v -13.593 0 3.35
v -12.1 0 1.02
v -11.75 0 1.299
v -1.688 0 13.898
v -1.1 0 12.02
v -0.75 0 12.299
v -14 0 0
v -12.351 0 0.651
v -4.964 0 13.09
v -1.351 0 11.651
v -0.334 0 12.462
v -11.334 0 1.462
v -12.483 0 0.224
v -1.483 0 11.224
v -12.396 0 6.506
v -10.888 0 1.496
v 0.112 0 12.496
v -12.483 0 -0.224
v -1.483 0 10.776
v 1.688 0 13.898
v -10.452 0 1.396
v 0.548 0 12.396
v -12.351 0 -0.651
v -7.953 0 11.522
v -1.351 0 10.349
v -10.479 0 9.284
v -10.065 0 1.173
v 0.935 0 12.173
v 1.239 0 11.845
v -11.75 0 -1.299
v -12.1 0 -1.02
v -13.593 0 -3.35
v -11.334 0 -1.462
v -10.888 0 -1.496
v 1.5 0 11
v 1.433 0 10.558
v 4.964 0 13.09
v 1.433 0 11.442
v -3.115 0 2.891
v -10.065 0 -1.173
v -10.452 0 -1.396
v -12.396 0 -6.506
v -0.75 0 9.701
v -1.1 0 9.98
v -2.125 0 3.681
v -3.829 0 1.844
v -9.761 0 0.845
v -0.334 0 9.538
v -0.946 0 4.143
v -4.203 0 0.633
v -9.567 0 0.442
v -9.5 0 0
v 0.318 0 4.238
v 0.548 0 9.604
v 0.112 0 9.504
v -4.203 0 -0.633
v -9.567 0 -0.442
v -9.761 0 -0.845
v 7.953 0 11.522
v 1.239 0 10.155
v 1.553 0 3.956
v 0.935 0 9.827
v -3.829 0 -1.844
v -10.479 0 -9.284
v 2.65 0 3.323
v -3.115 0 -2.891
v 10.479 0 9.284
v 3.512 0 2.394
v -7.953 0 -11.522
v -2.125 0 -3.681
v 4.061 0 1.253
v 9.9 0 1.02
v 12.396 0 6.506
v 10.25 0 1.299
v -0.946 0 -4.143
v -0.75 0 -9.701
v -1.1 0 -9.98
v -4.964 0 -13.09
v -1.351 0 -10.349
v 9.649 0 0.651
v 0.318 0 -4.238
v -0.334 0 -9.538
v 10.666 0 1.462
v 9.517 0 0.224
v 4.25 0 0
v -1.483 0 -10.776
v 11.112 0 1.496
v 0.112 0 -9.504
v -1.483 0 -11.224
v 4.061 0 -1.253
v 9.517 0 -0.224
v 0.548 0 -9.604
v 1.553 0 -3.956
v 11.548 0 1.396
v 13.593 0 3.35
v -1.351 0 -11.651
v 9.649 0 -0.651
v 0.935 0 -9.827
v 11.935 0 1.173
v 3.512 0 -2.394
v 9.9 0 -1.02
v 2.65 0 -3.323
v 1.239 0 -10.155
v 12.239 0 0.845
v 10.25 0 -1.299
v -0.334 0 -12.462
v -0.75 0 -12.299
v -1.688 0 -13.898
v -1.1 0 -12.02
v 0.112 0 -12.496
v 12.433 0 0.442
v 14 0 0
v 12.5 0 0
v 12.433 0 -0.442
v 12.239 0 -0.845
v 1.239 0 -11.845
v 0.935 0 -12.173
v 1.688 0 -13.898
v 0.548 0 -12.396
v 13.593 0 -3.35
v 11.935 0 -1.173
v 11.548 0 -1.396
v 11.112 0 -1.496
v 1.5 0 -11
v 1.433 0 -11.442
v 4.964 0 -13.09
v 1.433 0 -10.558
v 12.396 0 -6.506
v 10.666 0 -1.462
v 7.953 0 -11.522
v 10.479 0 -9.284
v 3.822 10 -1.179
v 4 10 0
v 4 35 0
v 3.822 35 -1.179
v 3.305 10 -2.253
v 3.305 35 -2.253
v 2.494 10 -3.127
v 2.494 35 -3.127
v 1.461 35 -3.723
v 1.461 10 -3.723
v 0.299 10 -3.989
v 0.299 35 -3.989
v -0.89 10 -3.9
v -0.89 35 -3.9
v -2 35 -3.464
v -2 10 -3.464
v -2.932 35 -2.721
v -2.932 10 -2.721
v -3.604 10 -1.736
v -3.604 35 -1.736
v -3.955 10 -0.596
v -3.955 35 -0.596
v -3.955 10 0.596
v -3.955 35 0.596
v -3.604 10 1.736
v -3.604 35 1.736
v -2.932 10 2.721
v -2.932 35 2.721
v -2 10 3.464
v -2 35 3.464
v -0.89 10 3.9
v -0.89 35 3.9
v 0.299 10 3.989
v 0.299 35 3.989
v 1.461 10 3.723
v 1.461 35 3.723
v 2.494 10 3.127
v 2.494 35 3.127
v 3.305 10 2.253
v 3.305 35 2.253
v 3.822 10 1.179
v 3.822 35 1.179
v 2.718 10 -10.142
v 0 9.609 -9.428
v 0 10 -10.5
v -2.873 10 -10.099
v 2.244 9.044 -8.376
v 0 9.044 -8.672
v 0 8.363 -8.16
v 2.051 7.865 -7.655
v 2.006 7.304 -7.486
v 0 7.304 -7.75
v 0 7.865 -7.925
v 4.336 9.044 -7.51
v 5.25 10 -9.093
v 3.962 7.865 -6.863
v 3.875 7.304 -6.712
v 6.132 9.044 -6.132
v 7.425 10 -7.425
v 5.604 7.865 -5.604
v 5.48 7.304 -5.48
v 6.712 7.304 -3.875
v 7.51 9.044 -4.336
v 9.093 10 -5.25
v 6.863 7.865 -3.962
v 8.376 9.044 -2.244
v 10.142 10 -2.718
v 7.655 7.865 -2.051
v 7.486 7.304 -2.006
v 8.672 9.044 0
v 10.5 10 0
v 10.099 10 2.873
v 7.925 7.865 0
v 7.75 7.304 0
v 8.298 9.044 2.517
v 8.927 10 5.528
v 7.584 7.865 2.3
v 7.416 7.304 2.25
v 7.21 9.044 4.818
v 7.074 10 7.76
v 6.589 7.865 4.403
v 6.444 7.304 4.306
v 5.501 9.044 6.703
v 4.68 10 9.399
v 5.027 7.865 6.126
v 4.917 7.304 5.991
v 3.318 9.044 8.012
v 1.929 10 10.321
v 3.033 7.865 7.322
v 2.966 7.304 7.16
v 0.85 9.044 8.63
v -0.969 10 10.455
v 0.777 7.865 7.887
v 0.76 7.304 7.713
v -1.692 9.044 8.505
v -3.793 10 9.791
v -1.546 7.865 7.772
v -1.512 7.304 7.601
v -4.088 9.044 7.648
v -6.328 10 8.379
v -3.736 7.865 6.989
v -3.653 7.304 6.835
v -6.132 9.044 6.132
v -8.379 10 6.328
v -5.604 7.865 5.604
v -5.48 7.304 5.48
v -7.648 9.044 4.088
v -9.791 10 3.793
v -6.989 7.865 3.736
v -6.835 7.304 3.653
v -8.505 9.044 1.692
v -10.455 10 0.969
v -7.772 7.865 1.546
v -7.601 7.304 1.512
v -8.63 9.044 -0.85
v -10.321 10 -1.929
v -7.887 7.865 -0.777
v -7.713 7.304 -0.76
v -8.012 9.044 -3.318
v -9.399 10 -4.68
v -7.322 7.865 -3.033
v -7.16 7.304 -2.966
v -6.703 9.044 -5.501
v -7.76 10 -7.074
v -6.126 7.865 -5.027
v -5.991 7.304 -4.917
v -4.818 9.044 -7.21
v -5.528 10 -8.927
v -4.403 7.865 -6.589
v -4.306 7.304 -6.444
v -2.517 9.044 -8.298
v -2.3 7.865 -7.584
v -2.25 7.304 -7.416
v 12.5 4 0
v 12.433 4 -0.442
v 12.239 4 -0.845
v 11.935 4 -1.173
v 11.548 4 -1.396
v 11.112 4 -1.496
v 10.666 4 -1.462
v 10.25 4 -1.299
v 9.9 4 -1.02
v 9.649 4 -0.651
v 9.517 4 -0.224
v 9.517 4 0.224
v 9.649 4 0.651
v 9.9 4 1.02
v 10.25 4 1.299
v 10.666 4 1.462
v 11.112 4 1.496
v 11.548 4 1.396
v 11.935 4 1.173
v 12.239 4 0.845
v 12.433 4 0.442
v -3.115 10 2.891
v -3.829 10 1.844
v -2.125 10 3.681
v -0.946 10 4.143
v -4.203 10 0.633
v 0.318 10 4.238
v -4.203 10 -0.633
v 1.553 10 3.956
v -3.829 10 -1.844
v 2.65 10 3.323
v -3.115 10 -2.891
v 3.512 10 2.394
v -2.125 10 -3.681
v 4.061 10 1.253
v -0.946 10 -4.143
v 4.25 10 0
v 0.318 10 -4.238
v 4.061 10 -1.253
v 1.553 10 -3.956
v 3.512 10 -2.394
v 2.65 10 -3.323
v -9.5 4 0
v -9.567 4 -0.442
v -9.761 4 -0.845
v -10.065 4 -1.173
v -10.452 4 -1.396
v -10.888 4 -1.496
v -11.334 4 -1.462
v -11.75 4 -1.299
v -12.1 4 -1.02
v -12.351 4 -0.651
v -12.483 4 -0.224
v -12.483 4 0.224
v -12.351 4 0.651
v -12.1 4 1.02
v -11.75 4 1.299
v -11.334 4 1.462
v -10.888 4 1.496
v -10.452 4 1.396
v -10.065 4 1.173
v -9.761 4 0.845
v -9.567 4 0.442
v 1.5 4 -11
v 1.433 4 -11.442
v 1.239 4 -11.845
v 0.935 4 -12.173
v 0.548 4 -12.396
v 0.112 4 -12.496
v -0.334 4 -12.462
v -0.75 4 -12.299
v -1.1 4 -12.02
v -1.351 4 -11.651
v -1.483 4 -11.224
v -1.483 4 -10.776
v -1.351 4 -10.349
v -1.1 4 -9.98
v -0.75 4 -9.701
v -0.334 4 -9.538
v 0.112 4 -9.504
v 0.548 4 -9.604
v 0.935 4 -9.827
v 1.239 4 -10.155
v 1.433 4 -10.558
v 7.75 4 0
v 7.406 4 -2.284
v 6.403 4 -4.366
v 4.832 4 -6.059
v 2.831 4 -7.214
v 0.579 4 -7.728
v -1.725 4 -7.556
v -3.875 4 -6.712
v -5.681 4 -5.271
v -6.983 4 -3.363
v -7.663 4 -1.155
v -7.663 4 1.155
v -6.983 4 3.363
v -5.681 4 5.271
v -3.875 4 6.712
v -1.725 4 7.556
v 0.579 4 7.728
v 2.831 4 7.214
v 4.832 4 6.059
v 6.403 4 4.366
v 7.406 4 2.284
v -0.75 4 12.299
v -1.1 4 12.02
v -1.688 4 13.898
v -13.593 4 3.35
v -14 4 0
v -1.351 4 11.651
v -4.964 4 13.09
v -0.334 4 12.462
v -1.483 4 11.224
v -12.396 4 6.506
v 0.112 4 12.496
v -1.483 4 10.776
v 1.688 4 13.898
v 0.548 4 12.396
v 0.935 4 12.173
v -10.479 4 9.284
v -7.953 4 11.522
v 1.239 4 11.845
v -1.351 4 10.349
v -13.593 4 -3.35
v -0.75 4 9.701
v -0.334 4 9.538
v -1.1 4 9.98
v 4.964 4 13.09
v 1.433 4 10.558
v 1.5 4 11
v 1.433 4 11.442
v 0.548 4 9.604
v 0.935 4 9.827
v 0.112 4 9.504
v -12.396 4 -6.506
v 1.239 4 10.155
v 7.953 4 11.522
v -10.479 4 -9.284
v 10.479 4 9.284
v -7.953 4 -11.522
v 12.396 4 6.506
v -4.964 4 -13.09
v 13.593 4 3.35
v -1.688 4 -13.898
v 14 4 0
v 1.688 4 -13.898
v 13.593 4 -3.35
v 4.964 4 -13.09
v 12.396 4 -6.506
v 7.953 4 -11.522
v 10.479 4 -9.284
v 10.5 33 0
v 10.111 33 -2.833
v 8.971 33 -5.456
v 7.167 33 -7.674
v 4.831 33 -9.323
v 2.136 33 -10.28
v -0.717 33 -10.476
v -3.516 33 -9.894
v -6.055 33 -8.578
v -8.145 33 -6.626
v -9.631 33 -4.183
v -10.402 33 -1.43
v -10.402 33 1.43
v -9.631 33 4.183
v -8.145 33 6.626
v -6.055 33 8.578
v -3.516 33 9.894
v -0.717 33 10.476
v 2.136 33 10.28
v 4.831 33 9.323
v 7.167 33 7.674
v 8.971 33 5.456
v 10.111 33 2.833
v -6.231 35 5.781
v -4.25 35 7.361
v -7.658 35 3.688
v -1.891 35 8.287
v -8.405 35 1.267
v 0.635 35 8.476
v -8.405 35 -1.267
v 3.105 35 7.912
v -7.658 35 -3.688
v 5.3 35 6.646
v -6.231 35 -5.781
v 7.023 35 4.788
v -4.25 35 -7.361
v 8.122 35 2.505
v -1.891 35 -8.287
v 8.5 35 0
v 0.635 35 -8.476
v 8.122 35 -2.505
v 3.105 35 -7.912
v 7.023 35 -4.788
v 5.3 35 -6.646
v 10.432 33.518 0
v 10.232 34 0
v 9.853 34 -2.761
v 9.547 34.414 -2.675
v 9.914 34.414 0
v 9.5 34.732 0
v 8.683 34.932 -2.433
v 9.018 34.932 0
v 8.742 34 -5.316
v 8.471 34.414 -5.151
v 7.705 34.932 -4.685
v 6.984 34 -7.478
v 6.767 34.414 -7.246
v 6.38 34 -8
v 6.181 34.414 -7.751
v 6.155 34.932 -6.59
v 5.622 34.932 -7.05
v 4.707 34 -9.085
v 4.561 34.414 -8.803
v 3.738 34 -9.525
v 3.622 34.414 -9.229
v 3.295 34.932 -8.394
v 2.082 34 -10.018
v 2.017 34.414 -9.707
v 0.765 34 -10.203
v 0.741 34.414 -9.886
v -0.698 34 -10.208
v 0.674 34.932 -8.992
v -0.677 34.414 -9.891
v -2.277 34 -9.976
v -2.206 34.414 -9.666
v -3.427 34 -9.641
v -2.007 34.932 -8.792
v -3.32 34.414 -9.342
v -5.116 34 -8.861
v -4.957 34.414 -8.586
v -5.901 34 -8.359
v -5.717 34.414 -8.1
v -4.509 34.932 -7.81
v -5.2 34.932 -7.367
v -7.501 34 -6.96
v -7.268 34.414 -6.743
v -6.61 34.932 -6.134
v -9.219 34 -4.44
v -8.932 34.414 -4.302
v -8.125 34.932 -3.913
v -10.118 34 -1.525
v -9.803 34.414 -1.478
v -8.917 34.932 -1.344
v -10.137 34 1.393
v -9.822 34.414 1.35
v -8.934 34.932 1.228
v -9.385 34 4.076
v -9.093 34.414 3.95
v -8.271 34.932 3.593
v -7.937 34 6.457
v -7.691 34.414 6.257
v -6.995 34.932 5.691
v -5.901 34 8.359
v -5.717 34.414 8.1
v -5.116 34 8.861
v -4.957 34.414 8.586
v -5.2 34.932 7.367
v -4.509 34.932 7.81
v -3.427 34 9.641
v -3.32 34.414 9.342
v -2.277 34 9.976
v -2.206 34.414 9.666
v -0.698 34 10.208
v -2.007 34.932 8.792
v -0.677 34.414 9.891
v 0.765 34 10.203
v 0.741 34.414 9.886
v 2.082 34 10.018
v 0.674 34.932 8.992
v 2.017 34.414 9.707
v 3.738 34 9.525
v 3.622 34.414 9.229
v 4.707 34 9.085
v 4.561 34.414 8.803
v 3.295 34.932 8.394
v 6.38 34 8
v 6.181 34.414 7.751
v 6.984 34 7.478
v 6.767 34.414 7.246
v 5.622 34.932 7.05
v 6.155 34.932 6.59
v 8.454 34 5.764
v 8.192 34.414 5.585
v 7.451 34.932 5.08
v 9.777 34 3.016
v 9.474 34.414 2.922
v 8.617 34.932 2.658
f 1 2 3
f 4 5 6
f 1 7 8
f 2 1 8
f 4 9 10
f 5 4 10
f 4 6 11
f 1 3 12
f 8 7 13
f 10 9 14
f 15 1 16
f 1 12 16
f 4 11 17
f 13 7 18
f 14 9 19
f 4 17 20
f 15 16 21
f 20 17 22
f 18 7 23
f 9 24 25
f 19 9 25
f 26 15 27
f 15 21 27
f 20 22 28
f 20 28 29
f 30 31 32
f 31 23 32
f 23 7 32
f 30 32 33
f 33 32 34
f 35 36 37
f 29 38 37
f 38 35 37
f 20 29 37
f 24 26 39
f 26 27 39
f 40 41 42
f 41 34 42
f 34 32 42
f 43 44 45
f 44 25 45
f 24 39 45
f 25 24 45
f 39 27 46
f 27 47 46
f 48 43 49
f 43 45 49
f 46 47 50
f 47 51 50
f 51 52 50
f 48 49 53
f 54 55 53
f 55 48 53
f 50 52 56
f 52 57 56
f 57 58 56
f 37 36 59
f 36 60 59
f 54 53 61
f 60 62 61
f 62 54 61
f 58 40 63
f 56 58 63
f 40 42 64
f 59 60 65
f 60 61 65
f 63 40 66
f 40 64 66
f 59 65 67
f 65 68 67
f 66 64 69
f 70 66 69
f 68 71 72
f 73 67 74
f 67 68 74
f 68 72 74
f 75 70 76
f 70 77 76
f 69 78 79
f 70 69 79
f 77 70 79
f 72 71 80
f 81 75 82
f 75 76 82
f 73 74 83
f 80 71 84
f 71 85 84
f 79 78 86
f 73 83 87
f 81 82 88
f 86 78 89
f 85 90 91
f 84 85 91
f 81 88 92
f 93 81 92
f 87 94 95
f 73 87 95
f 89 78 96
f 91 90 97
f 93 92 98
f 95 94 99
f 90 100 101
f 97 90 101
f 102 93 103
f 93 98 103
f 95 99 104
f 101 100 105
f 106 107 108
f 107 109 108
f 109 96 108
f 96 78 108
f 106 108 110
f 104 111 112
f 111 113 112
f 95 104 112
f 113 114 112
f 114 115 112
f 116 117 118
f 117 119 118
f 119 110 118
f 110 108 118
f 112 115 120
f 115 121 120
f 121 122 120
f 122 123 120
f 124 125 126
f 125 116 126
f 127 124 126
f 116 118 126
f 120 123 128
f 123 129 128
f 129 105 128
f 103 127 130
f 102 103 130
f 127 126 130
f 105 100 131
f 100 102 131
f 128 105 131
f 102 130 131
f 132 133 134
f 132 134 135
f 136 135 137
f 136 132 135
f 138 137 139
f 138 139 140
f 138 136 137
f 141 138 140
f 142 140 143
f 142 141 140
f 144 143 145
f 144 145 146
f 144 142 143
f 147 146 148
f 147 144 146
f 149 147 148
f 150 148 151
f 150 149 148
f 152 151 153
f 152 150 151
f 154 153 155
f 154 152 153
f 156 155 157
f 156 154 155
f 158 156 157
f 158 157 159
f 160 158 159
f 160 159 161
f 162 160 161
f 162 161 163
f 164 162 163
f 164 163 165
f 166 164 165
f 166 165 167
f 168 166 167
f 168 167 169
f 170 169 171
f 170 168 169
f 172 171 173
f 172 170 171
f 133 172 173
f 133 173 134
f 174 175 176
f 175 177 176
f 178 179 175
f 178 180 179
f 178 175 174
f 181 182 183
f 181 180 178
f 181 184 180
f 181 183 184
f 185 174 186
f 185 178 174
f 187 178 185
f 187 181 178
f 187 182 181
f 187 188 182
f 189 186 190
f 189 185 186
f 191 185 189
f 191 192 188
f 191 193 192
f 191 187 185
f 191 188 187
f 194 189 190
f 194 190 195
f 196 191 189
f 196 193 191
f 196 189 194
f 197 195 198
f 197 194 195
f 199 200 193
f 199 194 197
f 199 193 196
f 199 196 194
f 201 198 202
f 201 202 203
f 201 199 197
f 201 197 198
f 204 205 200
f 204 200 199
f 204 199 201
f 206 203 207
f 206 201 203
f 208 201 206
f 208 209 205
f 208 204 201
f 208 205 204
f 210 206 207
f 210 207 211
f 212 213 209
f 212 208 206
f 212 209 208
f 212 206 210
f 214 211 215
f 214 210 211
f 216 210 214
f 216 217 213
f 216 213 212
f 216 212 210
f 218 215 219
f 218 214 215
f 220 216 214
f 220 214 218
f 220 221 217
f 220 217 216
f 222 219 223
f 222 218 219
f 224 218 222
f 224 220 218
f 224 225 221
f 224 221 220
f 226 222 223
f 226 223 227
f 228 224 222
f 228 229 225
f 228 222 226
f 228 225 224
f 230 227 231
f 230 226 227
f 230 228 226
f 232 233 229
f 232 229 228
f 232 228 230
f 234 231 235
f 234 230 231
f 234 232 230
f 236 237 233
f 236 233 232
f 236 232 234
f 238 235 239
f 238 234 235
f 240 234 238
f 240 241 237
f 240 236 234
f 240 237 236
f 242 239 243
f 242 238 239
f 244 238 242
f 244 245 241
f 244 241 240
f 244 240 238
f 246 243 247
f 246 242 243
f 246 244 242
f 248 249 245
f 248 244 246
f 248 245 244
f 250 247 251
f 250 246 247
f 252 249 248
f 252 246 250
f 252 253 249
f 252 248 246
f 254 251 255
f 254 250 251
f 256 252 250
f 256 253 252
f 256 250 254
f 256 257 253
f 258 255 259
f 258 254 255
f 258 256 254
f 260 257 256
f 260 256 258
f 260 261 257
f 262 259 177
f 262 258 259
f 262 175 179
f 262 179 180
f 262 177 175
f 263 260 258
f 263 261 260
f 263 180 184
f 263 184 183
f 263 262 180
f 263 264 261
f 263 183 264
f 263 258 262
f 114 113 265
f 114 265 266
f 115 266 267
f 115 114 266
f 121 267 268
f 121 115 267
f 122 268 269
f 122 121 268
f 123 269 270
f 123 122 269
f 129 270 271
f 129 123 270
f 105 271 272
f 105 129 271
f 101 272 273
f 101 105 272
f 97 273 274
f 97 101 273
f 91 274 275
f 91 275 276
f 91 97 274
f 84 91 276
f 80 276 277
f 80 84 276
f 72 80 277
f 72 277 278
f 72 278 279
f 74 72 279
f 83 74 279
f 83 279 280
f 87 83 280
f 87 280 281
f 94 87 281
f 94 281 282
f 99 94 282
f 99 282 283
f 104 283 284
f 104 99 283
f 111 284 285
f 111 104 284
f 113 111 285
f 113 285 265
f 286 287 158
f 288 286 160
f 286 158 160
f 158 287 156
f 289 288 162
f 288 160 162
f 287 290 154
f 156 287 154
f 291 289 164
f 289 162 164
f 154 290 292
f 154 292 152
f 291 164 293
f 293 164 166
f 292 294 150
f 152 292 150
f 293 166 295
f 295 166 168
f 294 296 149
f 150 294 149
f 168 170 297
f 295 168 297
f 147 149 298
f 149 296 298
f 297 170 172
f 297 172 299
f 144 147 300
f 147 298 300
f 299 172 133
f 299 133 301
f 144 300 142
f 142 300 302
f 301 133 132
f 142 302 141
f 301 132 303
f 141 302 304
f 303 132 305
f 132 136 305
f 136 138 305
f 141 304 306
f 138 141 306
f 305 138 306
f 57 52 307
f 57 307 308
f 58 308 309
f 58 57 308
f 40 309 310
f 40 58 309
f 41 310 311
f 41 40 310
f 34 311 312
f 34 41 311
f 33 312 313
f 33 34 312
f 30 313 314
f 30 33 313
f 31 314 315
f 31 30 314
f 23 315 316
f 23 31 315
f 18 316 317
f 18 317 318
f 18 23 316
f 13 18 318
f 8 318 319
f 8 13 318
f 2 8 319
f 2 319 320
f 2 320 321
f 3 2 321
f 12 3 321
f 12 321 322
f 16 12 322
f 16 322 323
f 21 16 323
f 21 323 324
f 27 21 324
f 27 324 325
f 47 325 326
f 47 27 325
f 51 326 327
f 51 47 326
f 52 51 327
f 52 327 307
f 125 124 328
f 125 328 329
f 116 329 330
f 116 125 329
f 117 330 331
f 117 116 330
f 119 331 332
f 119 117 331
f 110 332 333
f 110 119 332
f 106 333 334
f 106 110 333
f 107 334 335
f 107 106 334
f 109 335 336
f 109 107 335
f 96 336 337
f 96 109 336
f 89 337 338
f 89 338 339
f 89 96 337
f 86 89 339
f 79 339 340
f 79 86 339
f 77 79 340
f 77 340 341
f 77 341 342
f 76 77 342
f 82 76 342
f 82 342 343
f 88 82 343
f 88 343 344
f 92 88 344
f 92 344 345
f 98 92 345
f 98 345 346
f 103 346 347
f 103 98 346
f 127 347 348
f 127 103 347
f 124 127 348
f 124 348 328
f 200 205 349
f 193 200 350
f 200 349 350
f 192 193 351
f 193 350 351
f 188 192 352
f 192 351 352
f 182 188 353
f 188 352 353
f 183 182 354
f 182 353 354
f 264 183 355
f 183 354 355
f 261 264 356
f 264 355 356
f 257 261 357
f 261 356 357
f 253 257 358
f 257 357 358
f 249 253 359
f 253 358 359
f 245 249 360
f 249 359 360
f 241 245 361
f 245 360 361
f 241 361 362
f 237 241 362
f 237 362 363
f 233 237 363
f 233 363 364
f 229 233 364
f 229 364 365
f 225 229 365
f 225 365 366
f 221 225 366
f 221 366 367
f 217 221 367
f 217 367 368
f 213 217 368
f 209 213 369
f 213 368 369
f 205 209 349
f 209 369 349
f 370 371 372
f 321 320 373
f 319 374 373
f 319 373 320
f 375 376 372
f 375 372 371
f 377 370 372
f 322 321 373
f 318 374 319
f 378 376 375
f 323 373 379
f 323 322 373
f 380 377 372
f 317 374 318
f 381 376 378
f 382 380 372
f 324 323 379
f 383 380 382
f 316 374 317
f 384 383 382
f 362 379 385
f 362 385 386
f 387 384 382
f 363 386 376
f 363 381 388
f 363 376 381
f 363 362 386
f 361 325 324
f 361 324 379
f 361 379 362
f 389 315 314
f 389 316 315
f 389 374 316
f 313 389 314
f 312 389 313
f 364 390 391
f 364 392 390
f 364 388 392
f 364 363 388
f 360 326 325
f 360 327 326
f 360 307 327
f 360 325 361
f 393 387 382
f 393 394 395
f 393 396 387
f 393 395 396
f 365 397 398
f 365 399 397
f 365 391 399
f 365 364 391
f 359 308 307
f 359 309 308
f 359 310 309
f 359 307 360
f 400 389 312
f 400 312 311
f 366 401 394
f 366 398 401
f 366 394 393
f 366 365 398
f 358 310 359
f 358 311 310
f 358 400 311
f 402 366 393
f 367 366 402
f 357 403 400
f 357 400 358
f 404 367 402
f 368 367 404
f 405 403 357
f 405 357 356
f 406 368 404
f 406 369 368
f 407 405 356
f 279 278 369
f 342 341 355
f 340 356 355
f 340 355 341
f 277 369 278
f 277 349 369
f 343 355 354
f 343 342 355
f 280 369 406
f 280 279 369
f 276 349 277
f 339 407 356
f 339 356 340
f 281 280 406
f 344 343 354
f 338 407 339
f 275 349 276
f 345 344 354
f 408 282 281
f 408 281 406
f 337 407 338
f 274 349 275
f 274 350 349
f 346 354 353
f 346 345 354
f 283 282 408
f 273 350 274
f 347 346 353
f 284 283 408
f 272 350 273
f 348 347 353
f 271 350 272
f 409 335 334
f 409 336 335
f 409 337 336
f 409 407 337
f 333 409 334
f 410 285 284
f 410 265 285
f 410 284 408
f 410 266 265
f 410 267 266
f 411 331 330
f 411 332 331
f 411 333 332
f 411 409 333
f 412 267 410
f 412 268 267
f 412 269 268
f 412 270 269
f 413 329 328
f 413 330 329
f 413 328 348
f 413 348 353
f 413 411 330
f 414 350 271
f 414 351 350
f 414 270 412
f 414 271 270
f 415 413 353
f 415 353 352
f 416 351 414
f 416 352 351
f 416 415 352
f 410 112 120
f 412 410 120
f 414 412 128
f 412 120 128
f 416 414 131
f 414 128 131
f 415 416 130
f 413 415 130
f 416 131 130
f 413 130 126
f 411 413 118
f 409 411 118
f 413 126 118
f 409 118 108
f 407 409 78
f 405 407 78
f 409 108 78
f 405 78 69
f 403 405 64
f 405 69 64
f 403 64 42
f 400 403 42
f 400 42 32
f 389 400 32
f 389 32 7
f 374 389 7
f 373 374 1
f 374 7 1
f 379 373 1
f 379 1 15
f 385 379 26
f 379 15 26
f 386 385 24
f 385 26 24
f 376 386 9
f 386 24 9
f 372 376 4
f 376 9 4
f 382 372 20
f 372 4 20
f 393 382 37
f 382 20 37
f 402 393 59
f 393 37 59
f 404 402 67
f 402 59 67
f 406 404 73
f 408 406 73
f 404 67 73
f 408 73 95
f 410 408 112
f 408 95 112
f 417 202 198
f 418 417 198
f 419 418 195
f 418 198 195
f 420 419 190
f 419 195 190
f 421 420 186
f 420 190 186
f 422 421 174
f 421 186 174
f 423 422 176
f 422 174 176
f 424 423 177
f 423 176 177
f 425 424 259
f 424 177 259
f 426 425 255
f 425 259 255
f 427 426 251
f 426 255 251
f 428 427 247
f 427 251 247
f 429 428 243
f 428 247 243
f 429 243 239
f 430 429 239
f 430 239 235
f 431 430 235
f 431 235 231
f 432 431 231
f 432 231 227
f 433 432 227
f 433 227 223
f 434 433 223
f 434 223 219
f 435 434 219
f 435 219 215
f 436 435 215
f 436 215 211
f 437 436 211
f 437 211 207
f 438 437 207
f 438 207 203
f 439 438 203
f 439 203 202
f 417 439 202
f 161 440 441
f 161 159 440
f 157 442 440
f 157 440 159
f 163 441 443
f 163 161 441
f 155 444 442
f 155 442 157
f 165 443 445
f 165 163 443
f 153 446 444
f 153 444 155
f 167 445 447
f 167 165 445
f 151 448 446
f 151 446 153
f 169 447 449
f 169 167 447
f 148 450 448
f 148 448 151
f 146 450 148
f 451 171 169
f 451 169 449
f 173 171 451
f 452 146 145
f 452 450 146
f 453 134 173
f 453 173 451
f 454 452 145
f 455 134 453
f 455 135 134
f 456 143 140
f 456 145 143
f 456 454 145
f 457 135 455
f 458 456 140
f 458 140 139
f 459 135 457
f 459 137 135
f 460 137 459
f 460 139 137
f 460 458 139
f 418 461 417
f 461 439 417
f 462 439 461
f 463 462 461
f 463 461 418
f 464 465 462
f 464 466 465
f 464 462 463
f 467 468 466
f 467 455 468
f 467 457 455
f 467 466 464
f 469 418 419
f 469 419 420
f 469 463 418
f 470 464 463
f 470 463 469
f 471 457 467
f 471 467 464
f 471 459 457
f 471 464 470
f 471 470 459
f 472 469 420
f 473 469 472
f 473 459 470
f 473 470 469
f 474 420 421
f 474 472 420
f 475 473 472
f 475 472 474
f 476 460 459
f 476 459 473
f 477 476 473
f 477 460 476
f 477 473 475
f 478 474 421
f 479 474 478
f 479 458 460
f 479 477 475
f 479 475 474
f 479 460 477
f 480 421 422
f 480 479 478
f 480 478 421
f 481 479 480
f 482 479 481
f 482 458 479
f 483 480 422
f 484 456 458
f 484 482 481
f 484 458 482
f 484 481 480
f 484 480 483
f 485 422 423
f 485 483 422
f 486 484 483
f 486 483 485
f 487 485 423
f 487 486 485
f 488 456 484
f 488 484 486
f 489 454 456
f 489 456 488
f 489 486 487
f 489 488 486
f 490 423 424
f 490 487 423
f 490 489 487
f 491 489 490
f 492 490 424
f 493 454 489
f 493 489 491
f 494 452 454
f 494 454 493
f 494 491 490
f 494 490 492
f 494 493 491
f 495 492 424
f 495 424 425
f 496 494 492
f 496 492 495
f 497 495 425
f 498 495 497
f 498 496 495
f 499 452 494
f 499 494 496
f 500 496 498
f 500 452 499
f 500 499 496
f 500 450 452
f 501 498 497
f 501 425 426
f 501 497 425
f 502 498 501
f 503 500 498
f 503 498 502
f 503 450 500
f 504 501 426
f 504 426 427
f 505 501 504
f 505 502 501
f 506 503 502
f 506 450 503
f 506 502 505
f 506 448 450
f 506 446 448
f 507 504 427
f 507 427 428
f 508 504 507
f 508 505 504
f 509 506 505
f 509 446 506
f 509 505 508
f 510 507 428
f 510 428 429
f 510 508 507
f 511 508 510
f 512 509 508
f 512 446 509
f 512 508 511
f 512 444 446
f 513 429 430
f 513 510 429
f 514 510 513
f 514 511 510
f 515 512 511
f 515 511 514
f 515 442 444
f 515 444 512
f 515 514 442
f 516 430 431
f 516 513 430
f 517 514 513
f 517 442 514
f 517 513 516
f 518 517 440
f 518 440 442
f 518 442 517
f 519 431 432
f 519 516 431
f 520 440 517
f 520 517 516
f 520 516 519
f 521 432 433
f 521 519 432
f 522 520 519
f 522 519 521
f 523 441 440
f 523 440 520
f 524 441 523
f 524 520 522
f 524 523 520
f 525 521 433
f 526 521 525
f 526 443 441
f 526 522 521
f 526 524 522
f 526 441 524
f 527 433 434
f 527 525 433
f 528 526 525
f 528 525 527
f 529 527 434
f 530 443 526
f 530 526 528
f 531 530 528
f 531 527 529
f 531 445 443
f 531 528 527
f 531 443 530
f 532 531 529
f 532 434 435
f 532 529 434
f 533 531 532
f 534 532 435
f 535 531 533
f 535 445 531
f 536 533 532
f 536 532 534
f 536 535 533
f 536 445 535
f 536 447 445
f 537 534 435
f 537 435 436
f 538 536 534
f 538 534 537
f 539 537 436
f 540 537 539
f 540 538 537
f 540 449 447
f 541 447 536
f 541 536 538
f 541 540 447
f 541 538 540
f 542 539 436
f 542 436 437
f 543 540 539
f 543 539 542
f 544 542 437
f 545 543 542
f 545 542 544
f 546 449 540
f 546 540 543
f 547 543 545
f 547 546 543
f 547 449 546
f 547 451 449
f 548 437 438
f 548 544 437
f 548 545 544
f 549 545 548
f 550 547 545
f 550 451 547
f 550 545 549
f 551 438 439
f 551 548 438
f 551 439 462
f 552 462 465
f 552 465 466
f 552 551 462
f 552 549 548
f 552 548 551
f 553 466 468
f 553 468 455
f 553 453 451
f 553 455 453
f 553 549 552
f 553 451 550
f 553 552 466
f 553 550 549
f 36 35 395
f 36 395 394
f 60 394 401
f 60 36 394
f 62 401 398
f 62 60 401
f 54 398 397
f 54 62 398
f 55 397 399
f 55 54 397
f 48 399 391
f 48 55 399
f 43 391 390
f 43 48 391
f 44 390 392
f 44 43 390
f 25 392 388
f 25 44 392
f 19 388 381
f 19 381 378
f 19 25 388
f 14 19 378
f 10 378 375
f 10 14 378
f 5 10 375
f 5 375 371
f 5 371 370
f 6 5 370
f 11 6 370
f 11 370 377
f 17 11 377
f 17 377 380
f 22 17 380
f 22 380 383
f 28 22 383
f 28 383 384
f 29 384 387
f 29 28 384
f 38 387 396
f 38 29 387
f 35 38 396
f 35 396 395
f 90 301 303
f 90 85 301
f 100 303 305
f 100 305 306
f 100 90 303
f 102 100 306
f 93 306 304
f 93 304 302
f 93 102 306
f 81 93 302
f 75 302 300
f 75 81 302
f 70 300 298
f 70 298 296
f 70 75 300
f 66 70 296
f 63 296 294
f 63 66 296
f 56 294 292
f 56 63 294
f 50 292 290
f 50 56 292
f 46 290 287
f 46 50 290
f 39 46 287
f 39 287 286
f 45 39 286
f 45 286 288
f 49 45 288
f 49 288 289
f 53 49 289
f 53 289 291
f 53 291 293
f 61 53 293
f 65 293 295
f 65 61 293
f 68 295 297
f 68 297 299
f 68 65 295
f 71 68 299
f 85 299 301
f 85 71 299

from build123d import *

# Parameters (mm, degrees)
SKETCH1_R           = 14
SKETCH1_R_2         = 1.5
SKETCH1_R_3         = 4.25
BOSS_EXTRUDE1_DEPTH = 4
SKETCH2_R           = 7.75
SKETCH2_R_2         = 4.25
BOSS_EXTRUDE2_DEPTH = 6
SKETCH3_R           = 10.5
SKETCH3_R_2         = 4
BOSS_EXTRUDE3_DEPTH = 25
FILLET1_R           = 2


with BuildPart() as part:
    # Sketch1 → Boss-Extrude1 (new body)
    with BuildSketch(Plane(origin=(0, 0, 0), x_dir=(1, 0, 0), z_dir=(0, 1, 0))):
        Circle(SKETCH1_R)
        with Locations((0, 11)):
            Circle(SKETCH1_R_2, mode=Mode.SUBTRACT)
        with Locations((0, -11)):
            Circle(SKETCH1_R_2, mode=Mode.SUBTRACT)
        with Locations((11, 0)):
            Circle(SKETCH1_R_2, mode=Mode.SUBTRACT)
        with Locations((-11, 0)):
            Circle(SKETCH1_R_2, mode=Mode.SUBTRACT)
        Circle(SKETCH1_R_3, mode=Mode.SUBTRACT)
    extrude(amount=BOSS_EXTRUDE1_DEPTH)

    # Sketch2 → Boss-Extrude2 (add)
    with BuildSketch(Plane(origin=(0, 4, 0), x_dir=(1, 0, 0), z_dir=(0, 1, 0))):
        Circle(SKETCH2_R)
        Circle(SKETCH2_R_2, mode=Mode.SUBTRACT)
    extrude(amount=BOSS_EXTRUDE2_DEPTH)



with BuildPart() as body_2:
    # Sketch3 → Boss-Extrude3 (new body)
    with BuildSketch(Plane(origin=(0, 10, 0), x_dir=(1, 0, 0), z_dir=(0, 1, 0))):
        Circle(SKETCH3_R)
        Circle(SKETCH3_R_2, mode=Mode.SUBTRACT)
    extrude(amount=BOSS_EXTRUDE3_DEPTH)


with BuildPart() as part_1:
    add(part.part)

    add(body_2.part)  # Revolve1 merges body 2
    # Sketch4 → Revolve1 (revolve)
    with BuildSketch(Plane(origin=(0, 0, 0), x_dir=(0, 0, -1), z_dir=(1, 0, 0))):
        with BuildLine():
            Line((7.75, 10), (10.5, 10))
            add(Edge.make_bspline(
                [(10.5, 10), (8.289227016, 9.506903226), (7.75, 7.304459311)],
                knots=[0, 0, 0, 1, 1, 1], degree=2))
            Line((7.75, 7.304459311), (7.75, 10))
        make_face()
    revolve(axis=Axis((0, 36.75, 0), (0, -1, 0)))

    # Fillet1
    fillet1_edges = [part_1.edges().sort_by_distance(p)[0] for p in [
        (-10.5, 35, 0),
    ]]
    fillet(fillet1_edges, radius=FILLET1_R)


solid = part_1.part
